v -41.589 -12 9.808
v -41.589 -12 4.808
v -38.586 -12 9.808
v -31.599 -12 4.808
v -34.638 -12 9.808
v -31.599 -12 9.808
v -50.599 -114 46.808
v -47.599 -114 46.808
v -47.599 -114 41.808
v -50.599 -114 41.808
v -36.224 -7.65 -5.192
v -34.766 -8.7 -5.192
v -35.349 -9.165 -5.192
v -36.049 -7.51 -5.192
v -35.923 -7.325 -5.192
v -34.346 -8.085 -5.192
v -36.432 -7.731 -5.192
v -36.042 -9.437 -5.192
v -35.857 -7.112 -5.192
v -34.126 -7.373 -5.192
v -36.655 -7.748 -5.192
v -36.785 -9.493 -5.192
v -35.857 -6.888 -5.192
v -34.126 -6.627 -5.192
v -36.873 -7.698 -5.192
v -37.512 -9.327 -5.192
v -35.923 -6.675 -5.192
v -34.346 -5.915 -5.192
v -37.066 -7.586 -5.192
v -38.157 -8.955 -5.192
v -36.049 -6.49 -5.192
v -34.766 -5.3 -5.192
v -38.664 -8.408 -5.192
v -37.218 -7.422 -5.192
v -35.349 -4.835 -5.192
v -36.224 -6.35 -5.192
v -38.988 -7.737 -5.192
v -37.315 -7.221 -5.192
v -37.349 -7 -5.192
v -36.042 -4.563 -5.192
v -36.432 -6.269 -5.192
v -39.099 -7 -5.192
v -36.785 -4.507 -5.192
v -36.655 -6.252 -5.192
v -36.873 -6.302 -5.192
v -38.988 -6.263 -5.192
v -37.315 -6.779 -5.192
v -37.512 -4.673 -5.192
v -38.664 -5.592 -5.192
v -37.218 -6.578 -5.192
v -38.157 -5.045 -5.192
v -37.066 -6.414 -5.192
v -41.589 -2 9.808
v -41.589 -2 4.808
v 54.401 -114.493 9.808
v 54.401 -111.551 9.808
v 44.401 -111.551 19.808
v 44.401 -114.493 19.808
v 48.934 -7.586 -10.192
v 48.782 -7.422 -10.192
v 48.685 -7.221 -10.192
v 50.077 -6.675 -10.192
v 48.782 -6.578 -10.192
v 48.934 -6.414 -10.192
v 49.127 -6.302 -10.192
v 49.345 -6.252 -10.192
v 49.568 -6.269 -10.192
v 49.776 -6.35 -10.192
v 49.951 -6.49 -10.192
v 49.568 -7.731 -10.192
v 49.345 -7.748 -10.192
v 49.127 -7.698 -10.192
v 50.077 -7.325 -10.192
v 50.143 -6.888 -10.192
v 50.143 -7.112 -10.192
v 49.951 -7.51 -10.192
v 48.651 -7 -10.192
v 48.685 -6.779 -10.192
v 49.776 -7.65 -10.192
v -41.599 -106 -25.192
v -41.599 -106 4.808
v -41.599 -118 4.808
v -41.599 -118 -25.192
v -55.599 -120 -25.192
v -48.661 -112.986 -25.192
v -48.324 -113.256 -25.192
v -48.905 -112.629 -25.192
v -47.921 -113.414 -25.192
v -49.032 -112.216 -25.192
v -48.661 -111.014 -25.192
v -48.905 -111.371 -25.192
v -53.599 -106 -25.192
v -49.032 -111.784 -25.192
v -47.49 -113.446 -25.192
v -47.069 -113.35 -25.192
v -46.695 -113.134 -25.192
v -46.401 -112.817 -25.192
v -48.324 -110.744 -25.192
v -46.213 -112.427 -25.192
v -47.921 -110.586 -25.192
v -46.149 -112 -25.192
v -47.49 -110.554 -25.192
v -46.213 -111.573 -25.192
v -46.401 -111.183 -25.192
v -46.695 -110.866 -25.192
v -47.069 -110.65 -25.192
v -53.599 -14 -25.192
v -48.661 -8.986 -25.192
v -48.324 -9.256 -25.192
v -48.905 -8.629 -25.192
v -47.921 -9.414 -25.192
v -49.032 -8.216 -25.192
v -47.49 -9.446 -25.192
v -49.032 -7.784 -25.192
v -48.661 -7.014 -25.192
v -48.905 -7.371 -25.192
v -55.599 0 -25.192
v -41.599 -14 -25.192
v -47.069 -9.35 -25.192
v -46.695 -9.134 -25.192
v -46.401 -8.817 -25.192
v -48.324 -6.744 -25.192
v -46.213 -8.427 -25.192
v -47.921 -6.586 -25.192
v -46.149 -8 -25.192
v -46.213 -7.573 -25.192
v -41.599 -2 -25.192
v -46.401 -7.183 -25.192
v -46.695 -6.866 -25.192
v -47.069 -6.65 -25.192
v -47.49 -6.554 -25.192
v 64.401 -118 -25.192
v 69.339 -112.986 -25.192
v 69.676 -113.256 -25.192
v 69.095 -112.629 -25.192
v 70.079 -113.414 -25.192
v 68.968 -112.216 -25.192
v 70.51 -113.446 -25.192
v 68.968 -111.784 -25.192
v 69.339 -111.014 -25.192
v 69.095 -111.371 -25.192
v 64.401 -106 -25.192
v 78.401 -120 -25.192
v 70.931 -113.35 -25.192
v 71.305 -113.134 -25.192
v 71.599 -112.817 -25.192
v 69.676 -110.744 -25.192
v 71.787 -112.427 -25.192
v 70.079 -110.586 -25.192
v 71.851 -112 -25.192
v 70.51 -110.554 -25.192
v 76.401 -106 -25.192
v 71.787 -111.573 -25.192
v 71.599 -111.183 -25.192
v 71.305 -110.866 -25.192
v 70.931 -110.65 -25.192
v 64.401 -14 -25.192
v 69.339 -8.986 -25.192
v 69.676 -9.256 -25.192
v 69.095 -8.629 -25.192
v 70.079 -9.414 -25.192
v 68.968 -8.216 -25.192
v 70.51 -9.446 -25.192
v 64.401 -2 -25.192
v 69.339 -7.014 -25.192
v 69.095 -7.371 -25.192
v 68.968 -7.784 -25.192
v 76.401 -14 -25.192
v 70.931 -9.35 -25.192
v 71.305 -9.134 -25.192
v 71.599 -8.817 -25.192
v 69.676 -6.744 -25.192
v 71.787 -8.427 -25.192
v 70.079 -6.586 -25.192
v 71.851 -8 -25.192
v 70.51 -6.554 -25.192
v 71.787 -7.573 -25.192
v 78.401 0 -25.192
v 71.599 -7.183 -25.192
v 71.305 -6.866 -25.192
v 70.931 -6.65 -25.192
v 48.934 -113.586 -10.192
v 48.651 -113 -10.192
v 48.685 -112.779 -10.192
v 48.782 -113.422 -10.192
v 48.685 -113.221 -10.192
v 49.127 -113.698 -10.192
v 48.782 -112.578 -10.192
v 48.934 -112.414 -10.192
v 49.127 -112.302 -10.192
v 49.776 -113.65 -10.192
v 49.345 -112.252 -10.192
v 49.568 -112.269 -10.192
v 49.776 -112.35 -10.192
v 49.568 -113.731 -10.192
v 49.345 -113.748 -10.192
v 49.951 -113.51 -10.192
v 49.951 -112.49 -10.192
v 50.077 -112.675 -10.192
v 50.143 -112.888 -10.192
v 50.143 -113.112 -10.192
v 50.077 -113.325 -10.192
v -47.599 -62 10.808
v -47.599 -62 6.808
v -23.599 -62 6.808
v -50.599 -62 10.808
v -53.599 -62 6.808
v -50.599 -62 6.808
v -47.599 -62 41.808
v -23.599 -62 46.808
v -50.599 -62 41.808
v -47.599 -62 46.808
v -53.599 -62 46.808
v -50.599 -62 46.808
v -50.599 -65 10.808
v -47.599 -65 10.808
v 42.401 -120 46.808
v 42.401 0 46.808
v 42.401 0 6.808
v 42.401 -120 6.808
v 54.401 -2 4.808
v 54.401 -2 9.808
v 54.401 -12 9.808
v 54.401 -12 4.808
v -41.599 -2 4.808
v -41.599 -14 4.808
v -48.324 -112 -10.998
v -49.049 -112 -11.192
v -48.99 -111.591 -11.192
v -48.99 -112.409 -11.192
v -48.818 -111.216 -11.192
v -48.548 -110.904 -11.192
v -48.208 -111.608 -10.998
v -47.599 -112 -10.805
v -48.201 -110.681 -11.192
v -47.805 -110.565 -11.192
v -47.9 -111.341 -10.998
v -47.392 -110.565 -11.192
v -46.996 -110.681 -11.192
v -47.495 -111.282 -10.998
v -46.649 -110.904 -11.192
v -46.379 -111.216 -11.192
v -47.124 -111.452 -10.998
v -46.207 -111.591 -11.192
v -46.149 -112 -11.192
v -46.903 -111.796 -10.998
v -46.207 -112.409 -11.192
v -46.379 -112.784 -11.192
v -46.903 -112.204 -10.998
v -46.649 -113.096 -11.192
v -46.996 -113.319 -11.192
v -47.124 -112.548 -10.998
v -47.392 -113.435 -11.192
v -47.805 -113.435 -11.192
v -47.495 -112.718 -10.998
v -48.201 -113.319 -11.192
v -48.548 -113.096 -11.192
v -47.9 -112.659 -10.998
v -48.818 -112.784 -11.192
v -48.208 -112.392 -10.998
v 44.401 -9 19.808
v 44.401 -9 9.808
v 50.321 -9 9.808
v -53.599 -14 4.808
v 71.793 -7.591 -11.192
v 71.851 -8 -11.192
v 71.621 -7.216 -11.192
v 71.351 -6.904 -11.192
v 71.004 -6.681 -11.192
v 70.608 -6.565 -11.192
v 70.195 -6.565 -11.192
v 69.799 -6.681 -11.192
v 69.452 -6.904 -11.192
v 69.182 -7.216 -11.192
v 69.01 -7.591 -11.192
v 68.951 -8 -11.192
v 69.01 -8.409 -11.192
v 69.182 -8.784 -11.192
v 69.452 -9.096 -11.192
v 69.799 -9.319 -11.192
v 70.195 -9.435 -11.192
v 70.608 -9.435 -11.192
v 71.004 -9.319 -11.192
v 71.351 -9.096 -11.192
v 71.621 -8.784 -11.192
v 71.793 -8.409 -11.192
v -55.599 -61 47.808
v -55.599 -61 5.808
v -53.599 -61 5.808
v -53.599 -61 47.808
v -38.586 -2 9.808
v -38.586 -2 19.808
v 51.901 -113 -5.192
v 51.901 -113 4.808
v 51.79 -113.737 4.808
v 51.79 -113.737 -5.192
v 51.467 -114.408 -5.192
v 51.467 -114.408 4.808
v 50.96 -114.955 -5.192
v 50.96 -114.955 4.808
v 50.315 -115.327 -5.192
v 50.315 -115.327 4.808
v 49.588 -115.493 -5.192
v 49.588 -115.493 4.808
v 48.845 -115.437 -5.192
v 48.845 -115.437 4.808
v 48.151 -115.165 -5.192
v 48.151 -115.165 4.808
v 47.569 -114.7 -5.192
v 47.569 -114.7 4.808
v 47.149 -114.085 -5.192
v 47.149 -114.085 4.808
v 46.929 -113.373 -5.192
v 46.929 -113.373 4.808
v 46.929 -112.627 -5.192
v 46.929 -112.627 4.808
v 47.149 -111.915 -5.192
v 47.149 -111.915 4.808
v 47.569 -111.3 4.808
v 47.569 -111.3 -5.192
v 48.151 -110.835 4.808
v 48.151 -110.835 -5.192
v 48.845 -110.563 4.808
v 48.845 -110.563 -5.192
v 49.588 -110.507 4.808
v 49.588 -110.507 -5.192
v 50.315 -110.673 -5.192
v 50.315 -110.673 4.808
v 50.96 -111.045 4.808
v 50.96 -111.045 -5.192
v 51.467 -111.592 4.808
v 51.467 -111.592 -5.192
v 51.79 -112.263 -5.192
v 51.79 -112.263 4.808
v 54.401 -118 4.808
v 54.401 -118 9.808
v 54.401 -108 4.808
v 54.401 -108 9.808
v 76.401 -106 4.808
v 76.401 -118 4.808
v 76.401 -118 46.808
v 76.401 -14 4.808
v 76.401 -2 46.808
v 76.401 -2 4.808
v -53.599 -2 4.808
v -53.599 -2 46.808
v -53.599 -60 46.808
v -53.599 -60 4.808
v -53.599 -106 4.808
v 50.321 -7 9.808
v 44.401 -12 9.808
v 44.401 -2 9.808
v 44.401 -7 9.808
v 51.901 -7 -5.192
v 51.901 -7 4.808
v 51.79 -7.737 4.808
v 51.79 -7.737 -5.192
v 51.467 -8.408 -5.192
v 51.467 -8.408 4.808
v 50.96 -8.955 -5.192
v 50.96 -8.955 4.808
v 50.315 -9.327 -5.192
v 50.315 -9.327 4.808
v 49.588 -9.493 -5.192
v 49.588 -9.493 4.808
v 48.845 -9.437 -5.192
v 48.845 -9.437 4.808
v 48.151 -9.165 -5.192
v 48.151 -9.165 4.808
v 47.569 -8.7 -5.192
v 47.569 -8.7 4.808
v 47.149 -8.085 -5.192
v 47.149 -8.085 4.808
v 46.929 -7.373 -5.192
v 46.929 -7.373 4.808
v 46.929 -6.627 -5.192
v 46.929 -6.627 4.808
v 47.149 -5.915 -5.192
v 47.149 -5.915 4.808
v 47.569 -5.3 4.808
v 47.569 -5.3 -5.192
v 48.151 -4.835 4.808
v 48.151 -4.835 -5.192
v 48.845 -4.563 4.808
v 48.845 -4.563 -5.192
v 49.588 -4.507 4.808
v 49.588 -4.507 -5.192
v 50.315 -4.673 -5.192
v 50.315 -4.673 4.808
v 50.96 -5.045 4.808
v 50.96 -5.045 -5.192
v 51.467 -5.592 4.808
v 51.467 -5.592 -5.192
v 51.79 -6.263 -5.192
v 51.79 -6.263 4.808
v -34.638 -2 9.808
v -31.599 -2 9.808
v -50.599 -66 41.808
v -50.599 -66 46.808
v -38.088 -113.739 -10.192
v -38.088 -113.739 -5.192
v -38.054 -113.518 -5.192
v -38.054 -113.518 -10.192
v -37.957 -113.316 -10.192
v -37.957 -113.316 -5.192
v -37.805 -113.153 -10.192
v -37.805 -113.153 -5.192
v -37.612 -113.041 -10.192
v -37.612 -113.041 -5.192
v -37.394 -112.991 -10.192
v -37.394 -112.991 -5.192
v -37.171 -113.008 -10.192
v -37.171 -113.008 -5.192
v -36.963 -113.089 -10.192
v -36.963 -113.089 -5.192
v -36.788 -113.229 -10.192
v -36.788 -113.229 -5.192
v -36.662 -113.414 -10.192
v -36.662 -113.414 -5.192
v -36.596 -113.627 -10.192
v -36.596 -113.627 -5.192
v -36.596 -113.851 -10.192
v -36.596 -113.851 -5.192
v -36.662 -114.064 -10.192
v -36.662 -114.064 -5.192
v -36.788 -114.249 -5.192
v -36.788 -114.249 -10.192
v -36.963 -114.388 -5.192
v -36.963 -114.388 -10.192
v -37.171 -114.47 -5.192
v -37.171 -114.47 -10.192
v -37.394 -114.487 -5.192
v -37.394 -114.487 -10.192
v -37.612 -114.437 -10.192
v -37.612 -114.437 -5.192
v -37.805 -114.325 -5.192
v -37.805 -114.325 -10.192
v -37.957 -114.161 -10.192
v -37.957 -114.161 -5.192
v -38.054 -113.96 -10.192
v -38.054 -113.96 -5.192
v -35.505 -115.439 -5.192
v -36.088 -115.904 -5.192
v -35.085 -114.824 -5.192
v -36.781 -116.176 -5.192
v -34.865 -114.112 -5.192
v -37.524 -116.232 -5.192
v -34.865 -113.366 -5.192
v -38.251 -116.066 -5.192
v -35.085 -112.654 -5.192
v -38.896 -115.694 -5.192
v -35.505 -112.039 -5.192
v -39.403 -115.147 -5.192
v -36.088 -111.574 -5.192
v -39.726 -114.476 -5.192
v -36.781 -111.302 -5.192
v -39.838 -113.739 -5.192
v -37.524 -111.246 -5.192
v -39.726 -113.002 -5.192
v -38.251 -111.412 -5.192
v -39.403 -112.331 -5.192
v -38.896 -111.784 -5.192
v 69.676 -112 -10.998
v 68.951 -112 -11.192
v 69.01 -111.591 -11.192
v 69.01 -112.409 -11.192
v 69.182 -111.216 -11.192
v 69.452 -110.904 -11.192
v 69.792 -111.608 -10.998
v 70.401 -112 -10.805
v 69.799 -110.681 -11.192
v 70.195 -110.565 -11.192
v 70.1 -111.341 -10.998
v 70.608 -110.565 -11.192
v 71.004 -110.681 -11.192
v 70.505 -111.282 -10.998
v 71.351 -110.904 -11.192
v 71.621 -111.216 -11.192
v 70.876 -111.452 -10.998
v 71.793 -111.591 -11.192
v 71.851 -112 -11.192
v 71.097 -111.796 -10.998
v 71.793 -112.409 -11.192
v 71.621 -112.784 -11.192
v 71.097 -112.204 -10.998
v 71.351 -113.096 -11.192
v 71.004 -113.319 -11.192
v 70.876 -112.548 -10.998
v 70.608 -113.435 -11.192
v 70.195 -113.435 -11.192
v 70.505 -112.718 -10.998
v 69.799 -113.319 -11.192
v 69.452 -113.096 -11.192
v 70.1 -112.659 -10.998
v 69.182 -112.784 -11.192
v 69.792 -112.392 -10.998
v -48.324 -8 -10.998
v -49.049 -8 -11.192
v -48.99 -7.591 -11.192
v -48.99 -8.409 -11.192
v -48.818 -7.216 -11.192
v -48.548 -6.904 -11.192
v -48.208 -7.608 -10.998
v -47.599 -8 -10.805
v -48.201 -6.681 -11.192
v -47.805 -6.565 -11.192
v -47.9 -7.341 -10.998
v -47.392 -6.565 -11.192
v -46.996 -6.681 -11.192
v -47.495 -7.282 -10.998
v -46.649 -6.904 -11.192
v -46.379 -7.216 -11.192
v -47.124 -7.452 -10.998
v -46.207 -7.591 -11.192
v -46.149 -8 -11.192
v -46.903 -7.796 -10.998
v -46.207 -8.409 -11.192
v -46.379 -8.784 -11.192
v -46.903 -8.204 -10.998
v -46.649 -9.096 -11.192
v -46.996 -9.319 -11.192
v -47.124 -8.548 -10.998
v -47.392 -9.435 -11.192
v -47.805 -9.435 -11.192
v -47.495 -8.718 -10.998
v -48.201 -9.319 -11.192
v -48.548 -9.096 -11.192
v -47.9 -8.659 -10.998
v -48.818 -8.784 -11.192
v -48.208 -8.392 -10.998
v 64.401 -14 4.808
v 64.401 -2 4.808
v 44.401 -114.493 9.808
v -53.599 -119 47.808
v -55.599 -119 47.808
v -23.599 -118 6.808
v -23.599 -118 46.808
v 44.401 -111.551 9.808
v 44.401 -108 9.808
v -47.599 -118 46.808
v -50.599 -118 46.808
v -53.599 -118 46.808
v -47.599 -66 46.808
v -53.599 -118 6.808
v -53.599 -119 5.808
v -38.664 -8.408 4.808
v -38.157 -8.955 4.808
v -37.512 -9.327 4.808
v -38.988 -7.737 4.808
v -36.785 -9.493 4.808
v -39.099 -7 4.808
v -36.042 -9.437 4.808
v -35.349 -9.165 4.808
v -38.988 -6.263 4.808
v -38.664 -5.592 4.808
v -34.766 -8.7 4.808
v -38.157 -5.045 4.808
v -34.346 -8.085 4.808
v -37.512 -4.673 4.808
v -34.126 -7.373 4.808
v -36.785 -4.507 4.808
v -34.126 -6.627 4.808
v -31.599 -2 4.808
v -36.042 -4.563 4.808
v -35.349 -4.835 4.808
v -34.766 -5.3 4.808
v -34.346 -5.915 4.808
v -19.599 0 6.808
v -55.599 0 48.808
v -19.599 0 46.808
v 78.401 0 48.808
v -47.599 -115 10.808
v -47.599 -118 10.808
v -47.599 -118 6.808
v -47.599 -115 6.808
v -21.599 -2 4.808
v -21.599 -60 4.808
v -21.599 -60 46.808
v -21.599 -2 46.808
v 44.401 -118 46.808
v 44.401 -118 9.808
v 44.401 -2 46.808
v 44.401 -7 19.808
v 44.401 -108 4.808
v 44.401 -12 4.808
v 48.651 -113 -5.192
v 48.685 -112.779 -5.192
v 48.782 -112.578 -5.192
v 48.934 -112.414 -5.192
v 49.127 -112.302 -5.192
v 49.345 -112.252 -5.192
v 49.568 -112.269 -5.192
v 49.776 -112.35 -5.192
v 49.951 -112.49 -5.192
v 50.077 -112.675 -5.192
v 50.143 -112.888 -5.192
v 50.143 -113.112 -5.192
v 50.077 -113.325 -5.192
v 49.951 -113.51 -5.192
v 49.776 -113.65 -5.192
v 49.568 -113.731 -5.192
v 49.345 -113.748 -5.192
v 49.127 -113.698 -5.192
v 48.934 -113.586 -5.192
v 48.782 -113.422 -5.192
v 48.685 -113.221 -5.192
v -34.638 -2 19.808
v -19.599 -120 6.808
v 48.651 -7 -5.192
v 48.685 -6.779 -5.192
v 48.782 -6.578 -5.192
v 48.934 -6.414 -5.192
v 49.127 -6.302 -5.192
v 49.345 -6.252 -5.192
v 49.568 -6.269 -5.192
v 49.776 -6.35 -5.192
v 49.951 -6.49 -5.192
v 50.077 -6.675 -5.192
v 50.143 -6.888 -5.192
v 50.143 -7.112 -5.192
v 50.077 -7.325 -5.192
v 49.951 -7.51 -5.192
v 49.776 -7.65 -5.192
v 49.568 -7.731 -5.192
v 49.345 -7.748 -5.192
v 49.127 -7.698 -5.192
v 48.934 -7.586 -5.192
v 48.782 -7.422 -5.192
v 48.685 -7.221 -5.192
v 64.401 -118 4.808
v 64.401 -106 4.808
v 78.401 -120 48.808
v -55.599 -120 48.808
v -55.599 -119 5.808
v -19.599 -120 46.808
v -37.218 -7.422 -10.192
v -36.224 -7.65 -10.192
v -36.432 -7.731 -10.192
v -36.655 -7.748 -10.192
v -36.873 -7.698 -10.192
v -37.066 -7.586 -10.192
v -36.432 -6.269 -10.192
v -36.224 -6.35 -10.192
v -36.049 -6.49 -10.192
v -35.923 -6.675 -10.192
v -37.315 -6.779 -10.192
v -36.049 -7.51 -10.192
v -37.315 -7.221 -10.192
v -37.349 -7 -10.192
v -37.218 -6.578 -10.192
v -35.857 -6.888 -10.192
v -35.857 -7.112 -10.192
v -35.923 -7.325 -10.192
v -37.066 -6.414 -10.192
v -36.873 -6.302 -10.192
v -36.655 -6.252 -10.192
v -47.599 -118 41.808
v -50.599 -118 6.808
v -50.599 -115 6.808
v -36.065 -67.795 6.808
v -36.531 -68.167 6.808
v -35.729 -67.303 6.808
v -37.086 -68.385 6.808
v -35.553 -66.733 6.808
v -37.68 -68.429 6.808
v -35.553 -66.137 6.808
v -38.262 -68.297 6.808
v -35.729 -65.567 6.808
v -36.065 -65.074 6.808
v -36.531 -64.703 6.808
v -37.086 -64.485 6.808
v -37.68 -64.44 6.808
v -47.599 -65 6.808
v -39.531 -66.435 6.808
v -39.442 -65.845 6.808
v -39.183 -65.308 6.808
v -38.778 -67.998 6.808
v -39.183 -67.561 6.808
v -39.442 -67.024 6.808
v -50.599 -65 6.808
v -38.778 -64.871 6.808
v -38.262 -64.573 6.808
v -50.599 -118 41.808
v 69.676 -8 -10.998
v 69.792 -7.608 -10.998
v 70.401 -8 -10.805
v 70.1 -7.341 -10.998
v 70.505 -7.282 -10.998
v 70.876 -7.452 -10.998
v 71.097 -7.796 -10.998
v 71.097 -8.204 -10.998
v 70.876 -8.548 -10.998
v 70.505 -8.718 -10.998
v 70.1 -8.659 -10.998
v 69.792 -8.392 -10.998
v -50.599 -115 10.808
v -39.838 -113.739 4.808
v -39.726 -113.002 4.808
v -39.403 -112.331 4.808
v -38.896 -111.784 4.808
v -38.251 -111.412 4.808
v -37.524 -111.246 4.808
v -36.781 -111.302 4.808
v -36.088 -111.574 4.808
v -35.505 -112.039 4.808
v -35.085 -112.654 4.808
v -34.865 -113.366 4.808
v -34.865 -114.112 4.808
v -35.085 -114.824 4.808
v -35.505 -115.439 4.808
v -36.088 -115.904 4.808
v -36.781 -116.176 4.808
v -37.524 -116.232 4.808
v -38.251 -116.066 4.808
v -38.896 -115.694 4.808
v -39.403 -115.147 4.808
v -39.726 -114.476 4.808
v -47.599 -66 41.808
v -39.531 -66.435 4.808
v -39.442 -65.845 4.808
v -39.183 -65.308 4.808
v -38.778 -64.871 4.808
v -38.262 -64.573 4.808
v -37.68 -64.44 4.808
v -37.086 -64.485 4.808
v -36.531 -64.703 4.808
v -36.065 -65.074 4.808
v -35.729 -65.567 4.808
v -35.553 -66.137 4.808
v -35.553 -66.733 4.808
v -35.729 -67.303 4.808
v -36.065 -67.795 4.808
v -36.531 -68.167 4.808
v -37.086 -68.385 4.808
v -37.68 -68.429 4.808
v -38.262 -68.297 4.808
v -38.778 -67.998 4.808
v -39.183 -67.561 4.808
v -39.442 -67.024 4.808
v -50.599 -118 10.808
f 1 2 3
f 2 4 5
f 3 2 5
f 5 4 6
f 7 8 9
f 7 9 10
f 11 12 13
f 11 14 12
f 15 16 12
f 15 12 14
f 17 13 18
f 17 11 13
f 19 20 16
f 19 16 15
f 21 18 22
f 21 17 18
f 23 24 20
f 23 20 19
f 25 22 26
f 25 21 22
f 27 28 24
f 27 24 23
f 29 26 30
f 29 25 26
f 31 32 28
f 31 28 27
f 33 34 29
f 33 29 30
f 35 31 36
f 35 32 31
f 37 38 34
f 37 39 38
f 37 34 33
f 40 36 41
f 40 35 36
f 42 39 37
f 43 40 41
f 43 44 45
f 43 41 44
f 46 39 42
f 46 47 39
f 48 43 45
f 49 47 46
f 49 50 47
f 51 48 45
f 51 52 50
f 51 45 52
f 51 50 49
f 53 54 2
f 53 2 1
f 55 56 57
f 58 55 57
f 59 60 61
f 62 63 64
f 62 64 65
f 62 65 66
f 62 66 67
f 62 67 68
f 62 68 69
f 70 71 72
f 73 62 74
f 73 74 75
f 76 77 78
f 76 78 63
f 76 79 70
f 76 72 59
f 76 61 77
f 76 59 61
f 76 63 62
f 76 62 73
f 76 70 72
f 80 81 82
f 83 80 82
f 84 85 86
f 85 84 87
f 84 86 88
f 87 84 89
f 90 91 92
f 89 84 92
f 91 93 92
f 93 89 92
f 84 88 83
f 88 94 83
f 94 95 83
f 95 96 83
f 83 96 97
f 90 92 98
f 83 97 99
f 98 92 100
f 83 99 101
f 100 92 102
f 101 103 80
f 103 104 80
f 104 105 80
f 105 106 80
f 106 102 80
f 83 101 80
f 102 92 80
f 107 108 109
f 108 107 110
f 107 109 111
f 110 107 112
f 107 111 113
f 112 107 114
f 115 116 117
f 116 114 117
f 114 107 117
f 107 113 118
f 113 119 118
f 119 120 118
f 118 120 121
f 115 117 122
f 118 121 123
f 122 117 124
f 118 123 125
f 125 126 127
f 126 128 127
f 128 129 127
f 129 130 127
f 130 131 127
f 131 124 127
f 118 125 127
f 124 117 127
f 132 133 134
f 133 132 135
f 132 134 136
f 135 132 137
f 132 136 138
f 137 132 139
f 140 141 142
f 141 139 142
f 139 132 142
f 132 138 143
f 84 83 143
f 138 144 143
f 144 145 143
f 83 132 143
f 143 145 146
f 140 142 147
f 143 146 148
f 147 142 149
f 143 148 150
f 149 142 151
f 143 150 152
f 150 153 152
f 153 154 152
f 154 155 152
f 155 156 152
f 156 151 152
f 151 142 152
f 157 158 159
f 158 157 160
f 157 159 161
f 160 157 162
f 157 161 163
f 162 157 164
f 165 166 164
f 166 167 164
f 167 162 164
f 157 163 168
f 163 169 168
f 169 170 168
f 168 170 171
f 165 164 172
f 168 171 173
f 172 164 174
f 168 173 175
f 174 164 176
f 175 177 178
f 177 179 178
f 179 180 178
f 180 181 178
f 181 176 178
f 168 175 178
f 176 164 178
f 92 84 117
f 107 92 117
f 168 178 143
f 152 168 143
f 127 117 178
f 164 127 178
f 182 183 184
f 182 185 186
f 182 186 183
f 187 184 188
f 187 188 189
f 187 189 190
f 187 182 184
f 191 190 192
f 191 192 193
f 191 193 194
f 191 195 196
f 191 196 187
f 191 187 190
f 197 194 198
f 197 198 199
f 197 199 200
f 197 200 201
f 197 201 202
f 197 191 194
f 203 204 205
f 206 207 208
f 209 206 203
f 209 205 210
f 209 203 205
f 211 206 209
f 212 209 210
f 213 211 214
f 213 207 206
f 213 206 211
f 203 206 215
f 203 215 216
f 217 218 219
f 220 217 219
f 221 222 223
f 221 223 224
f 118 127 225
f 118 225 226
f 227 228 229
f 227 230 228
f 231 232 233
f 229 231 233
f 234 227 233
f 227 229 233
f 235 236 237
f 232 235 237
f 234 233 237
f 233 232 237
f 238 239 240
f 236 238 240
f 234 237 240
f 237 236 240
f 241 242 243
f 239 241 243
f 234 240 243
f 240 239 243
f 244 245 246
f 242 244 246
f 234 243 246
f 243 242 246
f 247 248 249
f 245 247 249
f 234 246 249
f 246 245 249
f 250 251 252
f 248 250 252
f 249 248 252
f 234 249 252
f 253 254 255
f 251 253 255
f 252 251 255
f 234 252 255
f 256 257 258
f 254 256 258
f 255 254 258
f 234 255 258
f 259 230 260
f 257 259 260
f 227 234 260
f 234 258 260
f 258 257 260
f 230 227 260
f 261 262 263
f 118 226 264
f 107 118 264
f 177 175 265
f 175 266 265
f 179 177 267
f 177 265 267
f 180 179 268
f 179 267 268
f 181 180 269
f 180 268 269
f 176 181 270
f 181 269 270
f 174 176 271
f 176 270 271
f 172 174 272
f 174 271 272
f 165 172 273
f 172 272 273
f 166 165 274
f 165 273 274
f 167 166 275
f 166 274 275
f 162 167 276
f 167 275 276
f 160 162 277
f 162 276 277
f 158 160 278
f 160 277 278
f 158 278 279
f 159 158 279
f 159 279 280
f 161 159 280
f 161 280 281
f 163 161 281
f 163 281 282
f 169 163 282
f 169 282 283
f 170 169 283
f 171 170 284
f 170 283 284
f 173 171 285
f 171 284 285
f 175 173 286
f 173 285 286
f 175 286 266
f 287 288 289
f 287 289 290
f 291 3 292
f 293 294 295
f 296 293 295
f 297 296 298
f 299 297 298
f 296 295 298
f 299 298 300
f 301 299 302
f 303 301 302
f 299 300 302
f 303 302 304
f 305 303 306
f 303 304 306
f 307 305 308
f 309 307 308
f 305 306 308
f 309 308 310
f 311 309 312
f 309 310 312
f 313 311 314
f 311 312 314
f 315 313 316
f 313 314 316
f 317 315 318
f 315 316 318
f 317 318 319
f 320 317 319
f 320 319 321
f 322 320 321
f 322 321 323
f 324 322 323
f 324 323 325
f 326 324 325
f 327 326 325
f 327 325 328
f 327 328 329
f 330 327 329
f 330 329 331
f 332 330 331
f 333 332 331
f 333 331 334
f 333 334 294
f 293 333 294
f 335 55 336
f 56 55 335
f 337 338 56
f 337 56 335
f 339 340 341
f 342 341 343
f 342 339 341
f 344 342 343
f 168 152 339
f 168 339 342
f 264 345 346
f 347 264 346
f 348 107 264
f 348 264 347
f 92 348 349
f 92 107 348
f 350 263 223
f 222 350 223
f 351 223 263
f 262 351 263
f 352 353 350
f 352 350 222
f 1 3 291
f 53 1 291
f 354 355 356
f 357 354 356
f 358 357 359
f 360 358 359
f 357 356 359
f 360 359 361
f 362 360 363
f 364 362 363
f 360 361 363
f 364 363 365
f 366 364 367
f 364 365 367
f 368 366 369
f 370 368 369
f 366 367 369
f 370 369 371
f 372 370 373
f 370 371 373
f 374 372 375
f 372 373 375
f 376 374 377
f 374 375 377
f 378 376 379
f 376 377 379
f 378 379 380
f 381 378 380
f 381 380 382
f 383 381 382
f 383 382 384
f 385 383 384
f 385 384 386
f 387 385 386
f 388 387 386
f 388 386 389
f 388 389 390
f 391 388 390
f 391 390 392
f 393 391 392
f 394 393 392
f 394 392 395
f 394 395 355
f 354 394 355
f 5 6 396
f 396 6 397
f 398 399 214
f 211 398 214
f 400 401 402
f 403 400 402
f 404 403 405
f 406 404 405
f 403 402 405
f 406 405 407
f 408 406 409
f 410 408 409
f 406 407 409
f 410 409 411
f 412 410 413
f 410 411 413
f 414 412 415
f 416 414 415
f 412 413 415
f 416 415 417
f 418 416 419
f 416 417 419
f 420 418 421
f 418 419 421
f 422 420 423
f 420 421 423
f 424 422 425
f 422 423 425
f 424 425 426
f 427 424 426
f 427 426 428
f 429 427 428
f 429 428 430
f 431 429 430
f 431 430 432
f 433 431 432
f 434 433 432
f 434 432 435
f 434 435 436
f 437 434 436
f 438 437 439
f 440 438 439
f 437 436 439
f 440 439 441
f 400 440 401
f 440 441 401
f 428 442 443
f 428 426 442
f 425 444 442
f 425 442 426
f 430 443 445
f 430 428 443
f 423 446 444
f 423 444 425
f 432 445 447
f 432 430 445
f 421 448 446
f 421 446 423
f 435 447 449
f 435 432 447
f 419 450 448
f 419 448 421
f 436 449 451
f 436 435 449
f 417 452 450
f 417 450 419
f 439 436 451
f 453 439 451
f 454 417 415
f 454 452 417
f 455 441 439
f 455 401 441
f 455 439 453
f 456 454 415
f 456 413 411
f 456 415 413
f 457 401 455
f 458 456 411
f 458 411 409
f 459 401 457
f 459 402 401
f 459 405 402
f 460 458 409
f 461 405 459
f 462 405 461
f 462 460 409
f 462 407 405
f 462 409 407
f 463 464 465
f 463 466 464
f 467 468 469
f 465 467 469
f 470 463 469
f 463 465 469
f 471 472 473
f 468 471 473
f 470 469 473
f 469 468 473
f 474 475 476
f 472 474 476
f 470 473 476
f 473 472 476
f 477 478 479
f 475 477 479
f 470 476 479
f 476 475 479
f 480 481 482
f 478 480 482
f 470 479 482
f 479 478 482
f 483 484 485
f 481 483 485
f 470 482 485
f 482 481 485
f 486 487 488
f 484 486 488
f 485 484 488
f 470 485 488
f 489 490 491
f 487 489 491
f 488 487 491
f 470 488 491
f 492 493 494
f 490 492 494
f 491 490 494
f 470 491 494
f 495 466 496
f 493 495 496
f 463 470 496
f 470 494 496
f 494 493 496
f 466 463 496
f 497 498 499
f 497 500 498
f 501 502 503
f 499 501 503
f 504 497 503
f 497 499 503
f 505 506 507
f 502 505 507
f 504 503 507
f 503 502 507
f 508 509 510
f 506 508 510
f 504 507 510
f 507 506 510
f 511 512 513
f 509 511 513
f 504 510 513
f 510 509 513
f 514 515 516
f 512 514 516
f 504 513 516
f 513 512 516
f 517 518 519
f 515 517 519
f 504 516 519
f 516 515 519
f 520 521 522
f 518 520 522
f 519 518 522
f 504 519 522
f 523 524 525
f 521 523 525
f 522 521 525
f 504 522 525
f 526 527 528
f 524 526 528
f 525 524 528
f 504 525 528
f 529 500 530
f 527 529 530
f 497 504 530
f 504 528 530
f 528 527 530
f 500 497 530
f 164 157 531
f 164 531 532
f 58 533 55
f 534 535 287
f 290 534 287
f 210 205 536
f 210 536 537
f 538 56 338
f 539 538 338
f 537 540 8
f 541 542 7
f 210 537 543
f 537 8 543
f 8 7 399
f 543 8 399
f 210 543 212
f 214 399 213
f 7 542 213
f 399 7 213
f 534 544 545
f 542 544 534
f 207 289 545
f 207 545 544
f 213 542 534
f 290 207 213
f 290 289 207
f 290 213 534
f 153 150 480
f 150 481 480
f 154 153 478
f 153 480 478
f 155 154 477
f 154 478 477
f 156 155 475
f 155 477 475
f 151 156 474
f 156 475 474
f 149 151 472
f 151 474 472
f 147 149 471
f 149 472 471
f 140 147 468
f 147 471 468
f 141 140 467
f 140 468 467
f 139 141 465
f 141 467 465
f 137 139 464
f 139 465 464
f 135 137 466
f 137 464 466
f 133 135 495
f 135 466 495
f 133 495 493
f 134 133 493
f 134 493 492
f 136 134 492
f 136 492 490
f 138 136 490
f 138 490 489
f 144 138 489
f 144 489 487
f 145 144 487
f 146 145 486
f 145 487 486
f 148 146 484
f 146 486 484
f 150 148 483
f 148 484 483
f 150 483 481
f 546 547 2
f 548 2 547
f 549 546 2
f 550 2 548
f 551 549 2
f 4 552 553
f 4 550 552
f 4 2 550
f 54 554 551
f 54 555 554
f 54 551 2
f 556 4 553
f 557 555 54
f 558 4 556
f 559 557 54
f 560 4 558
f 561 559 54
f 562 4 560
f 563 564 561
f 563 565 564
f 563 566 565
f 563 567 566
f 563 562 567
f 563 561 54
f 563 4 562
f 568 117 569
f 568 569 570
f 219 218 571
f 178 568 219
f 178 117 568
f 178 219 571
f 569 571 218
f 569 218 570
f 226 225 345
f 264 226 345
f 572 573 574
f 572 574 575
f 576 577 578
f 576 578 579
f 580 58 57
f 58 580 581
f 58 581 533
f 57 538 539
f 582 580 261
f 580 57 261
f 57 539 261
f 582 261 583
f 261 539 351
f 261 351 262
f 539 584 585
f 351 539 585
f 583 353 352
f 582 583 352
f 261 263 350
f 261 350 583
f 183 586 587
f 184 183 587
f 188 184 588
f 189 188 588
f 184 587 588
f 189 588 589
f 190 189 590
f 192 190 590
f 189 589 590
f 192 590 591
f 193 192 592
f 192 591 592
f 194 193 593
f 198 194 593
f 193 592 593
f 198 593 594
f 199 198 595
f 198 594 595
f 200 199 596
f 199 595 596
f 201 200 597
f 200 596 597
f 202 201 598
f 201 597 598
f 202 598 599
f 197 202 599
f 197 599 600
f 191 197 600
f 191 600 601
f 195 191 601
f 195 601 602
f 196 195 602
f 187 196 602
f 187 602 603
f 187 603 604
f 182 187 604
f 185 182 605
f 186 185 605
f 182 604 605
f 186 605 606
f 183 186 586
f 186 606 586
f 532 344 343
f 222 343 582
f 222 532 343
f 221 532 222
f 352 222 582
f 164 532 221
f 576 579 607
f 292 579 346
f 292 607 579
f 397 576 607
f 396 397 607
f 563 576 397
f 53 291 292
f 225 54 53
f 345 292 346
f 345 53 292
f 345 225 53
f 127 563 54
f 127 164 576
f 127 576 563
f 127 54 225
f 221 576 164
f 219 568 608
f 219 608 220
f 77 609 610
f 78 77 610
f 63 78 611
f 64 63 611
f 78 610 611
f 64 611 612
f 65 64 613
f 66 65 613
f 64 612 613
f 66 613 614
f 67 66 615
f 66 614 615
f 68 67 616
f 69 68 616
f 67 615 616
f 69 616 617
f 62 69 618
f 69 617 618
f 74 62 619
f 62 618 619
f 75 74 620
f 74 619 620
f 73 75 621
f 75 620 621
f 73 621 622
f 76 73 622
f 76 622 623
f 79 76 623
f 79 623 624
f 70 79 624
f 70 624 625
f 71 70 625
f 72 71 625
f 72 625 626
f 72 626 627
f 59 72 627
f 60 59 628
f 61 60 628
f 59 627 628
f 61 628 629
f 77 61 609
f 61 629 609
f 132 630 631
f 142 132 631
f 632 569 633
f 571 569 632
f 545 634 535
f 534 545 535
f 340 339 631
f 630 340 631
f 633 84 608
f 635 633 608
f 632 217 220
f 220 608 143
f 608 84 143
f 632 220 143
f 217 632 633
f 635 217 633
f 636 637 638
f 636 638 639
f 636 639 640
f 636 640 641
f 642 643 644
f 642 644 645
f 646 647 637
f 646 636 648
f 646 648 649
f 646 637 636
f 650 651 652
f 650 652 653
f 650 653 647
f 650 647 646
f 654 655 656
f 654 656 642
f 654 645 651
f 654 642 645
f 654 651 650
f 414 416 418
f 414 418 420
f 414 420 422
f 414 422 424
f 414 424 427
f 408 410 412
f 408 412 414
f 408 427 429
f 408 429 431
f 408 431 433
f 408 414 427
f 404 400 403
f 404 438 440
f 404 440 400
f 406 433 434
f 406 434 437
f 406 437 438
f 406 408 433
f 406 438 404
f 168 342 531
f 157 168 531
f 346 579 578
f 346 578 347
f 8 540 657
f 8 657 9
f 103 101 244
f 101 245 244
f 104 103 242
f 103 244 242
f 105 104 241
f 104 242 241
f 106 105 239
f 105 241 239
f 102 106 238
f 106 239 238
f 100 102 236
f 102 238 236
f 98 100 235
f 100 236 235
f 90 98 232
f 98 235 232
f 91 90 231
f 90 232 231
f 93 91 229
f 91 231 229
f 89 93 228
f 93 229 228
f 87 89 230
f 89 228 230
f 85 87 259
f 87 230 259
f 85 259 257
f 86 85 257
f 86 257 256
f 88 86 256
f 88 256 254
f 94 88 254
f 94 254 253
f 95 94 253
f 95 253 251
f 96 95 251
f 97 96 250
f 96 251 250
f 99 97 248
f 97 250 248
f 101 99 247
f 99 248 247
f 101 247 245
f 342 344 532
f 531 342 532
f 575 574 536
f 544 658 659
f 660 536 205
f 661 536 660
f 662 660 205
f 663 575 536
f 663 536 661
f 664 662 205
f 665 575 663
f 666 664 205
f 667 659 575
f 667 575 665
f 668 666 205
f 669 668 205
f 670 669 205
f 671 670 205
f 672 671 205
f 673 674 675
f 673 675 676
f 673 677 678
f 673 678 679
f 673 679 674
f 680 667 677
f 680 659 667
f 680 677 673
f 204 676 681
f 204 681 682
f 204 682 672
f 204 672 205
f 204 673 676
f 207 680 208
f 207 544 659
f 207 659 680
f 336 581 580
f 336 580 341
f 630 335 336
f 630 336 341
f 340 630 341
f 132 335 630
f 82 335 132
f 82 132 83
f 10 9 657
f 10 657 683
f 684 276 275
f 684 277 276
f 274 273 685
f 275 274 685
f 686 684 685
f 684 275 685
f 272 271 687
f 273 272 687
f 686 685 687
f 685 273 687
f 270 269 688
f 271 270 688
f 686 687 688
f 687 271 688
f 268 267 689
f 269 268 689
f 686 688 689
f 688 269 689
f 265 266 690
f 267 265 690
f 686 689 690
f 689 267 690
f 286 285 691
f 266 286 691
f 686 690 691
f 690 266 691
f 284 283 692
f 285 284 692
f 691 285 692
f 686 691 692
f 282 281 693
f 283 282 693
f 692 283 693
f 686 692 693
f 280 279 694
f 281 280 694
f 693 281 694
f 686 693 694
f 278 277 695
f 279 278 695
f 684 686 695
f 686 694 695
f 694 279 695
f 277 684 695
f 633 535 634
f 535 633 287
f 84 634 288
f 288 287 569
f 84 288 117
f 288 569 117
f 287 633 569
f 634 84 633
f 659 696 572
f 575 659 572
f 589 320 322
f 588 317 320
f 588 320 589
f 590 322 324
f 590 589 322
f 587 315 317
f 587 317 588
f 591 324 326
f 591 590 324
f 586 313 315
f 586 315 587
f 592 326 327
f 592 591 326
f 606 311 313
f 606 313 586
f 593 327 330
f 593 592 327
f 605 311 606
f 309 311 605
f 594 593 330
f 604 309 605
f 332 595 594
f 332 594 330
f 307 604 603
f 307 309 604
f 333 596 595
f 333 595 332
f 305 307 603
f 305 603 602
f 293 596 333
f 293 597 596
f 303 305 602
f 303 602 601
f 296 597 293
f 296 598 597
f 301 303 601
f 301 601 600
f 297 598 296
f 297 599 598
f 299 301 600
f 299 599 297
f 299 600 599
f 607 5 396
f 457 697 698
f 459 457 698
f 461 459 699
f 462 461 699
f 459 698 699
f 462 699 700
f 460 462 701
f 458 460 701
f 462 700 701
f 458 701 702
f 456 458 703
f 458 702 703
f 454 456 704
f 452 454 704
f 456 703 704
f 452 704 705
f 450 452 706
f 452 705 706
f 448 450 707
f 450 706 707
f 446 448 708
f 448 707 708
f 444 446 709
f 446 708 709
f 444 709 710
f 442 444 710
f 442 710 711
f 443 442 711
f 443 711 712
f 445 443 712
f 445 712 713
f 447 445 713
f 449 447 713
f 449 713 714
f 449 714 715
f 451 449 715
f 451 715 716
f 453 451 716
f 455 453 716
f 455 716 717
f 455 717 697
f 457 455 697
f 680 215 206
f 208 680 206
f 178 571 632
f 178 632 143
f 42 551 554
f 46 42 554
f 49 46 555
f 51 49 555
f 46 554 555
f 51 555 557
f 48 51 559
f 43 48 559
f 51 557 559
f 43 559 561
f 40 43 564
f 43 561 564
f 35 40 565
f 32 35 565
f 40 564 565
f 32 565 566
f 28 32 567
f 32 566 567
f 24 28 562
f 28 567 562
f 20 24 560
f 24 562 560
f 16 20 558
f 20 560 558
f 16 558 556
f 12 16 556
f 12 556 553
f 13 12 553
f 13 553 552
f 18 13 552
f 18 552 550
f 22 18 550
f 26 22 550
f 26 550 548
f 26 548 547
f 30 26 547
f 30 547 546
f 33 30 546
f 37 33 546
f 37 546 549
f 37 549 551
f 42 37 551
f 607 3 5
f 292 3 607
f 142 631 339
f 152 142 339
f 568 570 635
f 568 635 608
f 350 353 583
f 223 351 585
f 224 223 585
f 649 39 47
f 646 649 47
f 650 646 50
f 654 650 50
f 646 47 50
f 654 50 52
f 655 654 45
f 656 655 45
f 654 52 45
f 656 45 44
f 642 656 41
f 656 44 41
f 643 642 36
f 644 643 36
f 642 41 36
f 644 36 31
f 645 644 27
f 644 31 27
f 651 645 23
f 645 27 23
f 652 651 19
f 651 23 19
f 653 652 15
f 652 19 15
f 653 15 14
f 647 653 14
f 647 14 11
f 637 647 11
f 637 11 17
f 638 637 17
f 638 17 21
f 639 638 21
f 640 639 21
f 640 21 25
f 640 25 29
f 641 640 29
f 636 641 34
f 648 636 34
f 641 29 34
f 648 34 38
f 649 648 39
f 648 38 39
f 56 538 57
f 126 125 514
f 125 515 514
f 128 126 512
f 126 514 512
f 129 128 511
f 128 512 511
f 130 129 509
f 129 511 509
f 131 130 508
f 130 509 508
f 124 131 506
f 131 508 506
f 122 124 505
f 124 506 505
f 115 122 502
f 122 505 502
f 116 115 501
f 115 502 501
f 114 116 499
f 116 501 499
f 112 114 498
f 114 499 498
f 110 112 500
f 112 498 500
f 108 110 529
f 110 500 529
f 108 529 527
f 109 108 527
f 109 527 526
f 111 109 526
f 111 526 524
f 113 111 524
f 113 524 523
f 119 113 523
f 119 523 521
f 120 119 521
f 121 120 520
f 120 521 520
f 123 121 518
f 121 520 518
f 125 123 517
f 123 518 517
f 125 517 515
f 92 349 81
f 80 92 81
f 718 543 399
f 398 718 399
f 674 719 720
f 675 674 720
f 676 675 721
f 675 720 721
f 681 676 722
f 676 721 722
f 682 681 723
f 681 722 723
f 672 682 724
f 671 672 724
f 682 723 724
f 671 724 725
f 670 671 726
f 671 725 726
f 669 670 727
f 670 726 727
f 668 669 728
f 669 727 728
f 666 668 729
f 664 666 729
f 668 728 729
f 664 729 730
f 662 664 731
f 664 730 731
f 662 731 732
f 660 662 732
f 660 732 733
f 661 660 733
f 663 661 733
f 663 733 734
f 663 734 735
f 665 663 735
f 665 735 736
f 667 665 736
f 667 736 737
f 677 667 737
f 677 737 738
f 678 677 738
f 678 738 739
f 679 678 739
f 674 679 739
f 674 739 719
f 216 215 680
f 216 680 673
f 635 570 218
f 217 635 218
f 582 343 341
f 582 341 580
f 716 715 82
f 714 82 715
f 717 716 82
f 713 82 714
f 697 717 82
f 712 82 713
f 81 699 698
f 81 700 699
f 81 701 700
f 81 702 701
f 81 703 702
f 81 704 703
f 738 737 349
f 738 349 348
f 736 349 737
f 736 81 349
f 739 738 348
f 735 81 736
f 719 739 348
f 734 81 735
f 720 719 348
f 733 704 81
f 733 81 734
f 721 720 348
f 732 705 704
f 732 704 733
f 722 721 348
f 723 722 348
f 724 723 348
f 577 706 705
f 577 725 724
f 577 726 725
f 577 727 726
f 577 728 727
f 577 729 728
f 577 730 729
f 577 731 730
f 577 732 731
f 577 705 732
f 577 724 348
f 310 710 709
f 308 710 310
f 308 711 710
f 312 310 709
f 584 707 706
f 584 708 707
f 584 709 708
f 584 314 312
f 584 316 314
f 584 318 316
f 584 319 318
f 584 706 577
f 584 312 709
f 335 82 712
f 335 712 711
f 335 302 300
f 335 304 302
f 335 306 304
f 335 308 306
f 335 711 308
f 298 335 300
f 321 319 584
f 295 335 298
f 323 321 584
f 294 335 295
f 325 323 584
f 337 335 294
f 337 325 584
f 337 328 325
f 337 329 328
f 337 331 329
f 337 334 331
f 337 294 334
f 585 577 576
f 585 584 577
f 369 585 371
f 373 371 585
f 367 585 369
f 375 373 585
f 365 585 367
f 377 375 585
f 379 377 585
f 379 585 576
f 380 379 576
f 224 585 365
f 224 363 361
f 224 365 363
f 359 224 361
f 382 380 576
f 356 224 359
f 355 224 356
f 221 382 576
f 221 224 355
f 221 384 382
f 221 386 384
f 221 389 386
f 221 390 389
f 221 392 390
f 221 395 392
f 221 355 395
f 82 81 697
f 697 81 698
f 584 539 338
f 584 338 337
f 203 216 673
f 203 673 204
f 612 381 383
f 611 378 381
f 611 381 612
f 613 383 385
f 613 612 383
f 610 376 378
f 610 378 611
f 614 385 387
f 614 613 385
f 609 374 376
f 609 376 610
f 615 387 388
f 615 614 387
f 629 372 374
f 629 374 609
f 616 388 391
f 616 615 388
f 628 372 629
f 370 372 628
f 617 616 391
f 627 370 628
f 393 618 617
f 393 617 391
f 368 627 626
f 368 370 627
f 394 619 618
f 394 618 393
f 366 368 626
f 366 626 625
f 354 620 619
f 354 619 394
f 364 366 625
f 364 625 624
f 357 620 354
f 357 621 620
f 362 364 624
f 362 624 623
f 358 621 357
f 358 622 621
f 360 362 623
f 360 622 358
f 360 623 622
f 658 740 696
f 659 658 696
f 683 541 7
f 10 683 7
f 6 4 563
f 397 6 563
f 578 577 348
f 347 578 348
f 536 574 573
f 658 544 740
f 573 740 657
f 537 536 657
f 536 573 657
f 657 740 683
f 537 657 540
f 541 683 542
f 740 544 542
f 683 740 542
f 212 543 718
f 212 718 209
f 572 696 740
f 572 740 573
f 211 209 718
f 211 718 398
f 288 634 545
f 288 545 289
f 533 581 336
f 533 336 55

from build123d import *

# Parameters (mm, degrees)
SKETCH1_W                      = 134
SKETCH1_H                      = 74
SKETCH1_W_2                    = 62
SKETCH1_H_2                    = 40
BOSS_EXTRUDE1_DEPTH            = 120
CUT_EXTRUDE1_DEPTH             = 30
SKETCH4_W                      = 32
SKETCH4_H                      = 58
CUT_EXTRUDE2_DEPTH             = 42
SKETCH5_W                      = 32
SKETCH5_H                      = 116
CUT_EXTRUDE3_DEPTH             = 42
M2_5_CLEARANCE_HOLE1_D         = 2.9
M2_5_CLEARANCE_HOLE1_DEPTH     = 14
M2_5_CLEARANCE_HOLE1_TIP       = 0.386628252
SKETCH9_W                      = 40
SKETCH9_H                      = 56
CUT_EXTRUDE9_DEPTH             = 32
CUT_EXTRUDE5_DEPTH             = 20
CUT_EXTRUDE6_DEPTH             = 10
SKETCH12_W                     = 5
SKETCH12_H                     = 10
BOSS_EXTRUDE2_DEPTH            = 10
SKETCH13_R                     = 2.5
BOSS_EXTRUDE4_DEPTH            = 15
SKETCH14_W                     = 5
SKETCH14_H                     = 10
BOSS_EXTRUDE3_DEPTH            = 19.99
SKETCH17_W                     = 10
SKETCH17_H                     = 10
CUT_EXTRUDE10_DEPTH            = 5
SKETCH18_R                     = 2.5
BOSS_EXTRUDE5_DEPTH            = 15
CUT_EXTRUDE11_START            = -5
SKETCH19_R                     = 2.5
SKETCH19_R_2                   = 0.75
CUT_EXTRUDE11_DEPTH            = 5
SKETCH24_W                     = 5.919805253
SKETCH24_H                     = 2
BOSS_EXTRUDE6_DEPTH            = 10
CUT_EXTRUDE14_REACH            = 146.395
SKETCH26_W                     = 10
SKETCH26_H                     = 2.941902197
BOSS_EXTRUDE7_DEPTH            = 10
CUT_EXTRUDE15_REACH            = 146.819
SKETCH30_W                     = 3.947736589
SKETCH30_H                     = 10
BOSS_EXTRUDE8_DEPTH            = 10
CUT_EXTRUDE18_REACH            = 176.552
SKETCH33_W                     = 42
SKETCH33_H                     = 58
SKETCH33_W_2                   = 40
SKETCH33_H_2                   = 56
CUT_EXTRUDE20_DEPTH            = 2
CUT_EXTRUDE21_REACH            = 151.943
SKETCH34_R                     = 2
SKETCH36_W                     = 3
SKETCH36_H                     = 4
SUPORTE_DA_TAMPA_PILHA_DEPTH   = 5
SKETCH37_W                     = 3
SKETCH37_H                     = 3
SUPORTE_DA_TAMPA_2_PILHA_DEPTH = 4


with BuildPart() as part:
    # Sketch1 → Boss-Extrude1 (new body)
    with BuildSketch(Plane(origin=(0, 0, 0), x_dir=(1, 0, 0), z_dir=(0, 1, 0))):
        with Locations((11.401433692, -11.808243728)):
            Rectangle(SKETCH1_W, SKETCH1_H)
        with Locations((11.401433692, -26.808243728)):
            Rectangle(SKETCH1_W_2, SKETCH1_H_2, mode=Mode.SUBTRACT)
    extrude(amount=-BOSS_EXTRUDE1_DEPTH)

    # Sketch2 → Cut-Extrude1 (cut)
    with BuildSketch(Plane(origin=(0, 0, -25.191756272), x_dir=(-1, 0, 0), z_dir=(0, 0, -1))):
        Polygon((21.598566308, -118), (-64.401433692, -118), (-64.401433692, -106), (-76.401433692, -106), (-76.401433692, -14), (-64.401433692, -14), (-64.401433692, -2), (41.598566308, -2), (41.598566308, -14), (53.598566308, -14), (53.598566308, -88), (21.598566308, -88), align=None)
    extrude(amount=-CUT_EXTRUDE1_DEPTH, mode=Mode.SUBTRACT)

    # Sketch4 → Cut-Extrude2 (cut)
    with BuildSketch(Plane(origin=(0, 0, 4.808243728), x_dir=(-1, 0, 0), z_dir=(0, 0, -1))):
        with Locations((37.598566308, -31)):
            Rectangle(SKETCH4_W, SKETCH4_H)
    extrude(amount=-CUT_EXTRUDE2_DEPTH, mode=Mode.SUBTRACT)

    # Sketch5 → Cut-Extrude3 (cut)
    with BuildSketch(Plane(origin=(0, 0, 4.808243728), x_dir=(-1, 0, 0), z_dir=(0, 0, -1))):
        with Locations((-60.401433692, -60)):
            Rectangle(SKETCH5_W, SKETCH5_H)
    extrude(amount=-CUT_EXTRUDE3_DEPTH, mode=Mode.SUBTRACT)

    # M2.5 Clearance Hole1
    with Locations(Plane(origin=(0, 0, -25.191756272), x_dir=(-1, 0, 0), z_dir=(0, 0, -1))):
        with Locations((-70.401433692, -8), (47.598566308, -8), (47.598566308, -112), (-70.401433692, -112)):
            Hole(M2_5_CLEARANCE_HOLE1_D / 2, depth=M2_5_CLEARANCE_HOLE1_DEPTH)
            with Locations((0, 0, -(M2_5_CLEARANCE_HOLE1_DEPTH + M2_5_CLEARANCE_HOLE1_TIP / 2))):  # 150.14° drill point
                Cone(0, M2_5_CLEARANCE_HOLE1_D / 2, M2_5_CLEARANCE_HOLE1_TIP, mode=Mode.SUBTRACT)

    # Sketch9 → Cut-Extrude9 (cut)
    with BuildSketch(Plane.ZY.offset(55.598566308)):
        with Locations((26.808243728, -90)):
            Rectangle(SKETCH9_W, SKETCH9_H)
    extrude(amount=-CUT_EXTRUDE9_DEPTH, mode=Mode.SUBTRACT)

    # Sketch10 → Cut-Extrude5 (cut)
    with BuildSketch(Plane(origin=(0, 0, -25.191756272), x_dir=(-1, 0, 0), z_dir=(0, 0, -1))):
        Polygon((21.598566308, -88), (53.598566308, -88), (53.598566308, -106), (41.598566308, -106), (41.598566308, -118), (21.598566308, -118), align=None)
    extrude(amount=-CUT_EXTRUDE5_DEPTH, mode=Mode.SUBTRACT)

    # Sketch11 → Cut-Extrude6 (cut)
    with BuildSketch(Plane(origin=(0, 0, -5.191756272), x_dir=(-1, 0, 0), z_dir=(0, 0, -1))):
        Polygon((53.598566308, -88), (21.598566308, -88), (21.598566308, -118), (41.598566308, -118), (41.598566308, -106), (53.598566308, -106), align=None)
    extrude(amount=-CUT_EXTRUDE6_DEPTH, mode=Mode.SUBTRACT)

    # Sketch12 → Boss-Extrude2 (add)
    with BuildSketch(Plane(origin=(44.401433692, 0, 0), x_dir=(0, 0, -1), z_dir=(1, 0, 0))):
        with Locations((-7.308243728, -7)):
            Rectangle(SKETCH12_W, SKETCH12_H)
        with Locations((-7.308243728, -113)):
            Rectangle(SKETCH12_W, SKETCH12_H)
    extrude(amount=BOSS_EXTRUDE2_DEPTH)

    # Sketch13 → Boss-Extrude4 (add)
    with BuildSketch(Plane(origin=(0, 0, 4.808243728), x_dir=(-1, 0, 0), z_dir=(0, 0, -1))):
        with Locations(Location((-49.401433692, -7, 0), (0, 0, 180))):
            Circle(SKETCH13_R)
        with Locations(Location((-49.401433692, -113, 0), (0, 0, 180))):
            Circle(SKETCH13_R)
    extrude(amount=BOSS_EXTRUDE4_DEPTH)

    # Sketch14 → Boss-Extrude3 (add)
    with BuildSketch(Plane.ZY.offset(21.598566308)):
        with Locations((7.308243728, -7)):
            Rectangle(SKETCH14_W, SKETCH14_H)
    extrude(amount=BOSS_EXTRUDE3_DEPTH)

    # Sketch17 → Cut-Extrude10 (cut)
    with BuildSketch(Plane(origin=(0, 0, 4.808243728), x_dir=(-1, 0, 0), z_dir=(0, 0, -1))):
        with Locations((26.598566308, -7)):
            Rectangle(SKETCH17_W, SKETCH17_H)
    extrude(amount=-CUT_EXTRUDE10_DEPTH, mode=Mode.SUBTRACT)

    # Sketch18 → Boss-Extrude5 (add)
    with BuildSketch(Plane(origin=(0, 0, 4.808243728), x_dir=(-1, 0, 0), z_dir=(0, 0, -1))):
        with Locations((36.598571318, -7)):
            Circle(SKETCH18_R)
        with Locations((37.337526325, -113.738960016)):
            Circle(SKETCH18_R)
    extrude(amount=BOSS_EXTRUDE5_DEPTH)

    # Sketch19 → Cut-Extrude11 (cut)
    # profile 1 of 4: a face of its own
    with BuildSketch(Plane(origin=(0, 0, -10.191756272), x_dir=(-1, 0, 0), z_dir=(0, 0, -1)).offset(CUT_EXTRUDE11_START)):
        with Locations(Location((-49.401433692, -113, 0), (0, 0, 180))):
            Circle(SKETCH19_R)
        with Locations((-49.401433692, -113)):
            Circle(SKETCH19_R_2, mode=Mode.SUBTRACT)
    # profile 2 of 4: a face of its own
    with BuildSketch(Plane(origin=(0, 0, -10.191756272), x_dir=(-1, 0, 0), z_dir=(0, 0, -1)).offset(CUT_EXTRUDE11_START)):
        with Locations(Location((-49.401433692, -7, 0), (0, 0, 180))):
            Circle(SKETCH19_R)
        with Locations((-49.401433692, -7)):
            Circle(SKETCH19_R_2, mode=Mode.SUBTRACT)
    # profile 3 of 4: a face of its own
    with BuildSketch(Plane(origin=(0, 0, -10.191756272), x_dir=(-1, 0, 0), z_dir=(0, 0, -1)).offset(CUT_EXTRUDE11_START)):
        with Locations((36.598571318, -7)):
            Circle(SKETCH19_R)
        with Locations((36.598571318, -7)):
            Circle(SKETCH19_R_2, mode=Mode.SUBTRACT)
    # profile 4 of 4: a face of its own
    with BuildSketch(Plane(origin=(0, 0, -10.191756272), x_dir=(-1, 0, 0), z_dir=(0, 0, -1)).offset(CUT_EXTRUDE11_START)):
        with Locations((37.337526325, -113.738960016)):
            Circle(SKETCH19_R)
        with Locations((37.337526325, -113.738960016)):
            Circle(SKETCH19_R_2, mode=Mode.SUBTRACT)
    extrude(amount=CUT_EXTRUDE11_DEPTH, mode=Mode.SUBTRACT)

    # Sketch24 → Boss-Extrude6 (add)
    with BuildSketch(Plane.XY.offset(9.808243728)):
        with Locations((47.361336319, -8)):
            Rectangle(SKETCH24_W, SKETCH24_H)
    extrude(amount=BOSS_EXTRUDE6_DEPTH)

    # Sketch25 → Cut-Extrude14 (cut, up to next)
    with BuildSketch(Plane.XZ.offset(9), mode=Mode.PRIVATE) as cut_extrude14_sk1:
        Polygon((50.321238945, 9.808243728), (44.401433692, 19.808243728), (50.321238945, 19.808243728), align=None)
    cut_extrude14_tool1 = extrude(cut_extrude14_sk1.sketch, amount=-CUT_EXTRUDE14_REACH, mode=Mode.PRIVATE) & part.part
    add(cut_extrude14_tool1.solids().sort_by_distance((48.347971, -9, 16.47491))[0], mode=Mode.SUBTRACT)

    # Sketch26 → Boss-Extrude7 (add)
    with BuildSketch(Plane.XY.offset(9.808243728)):
        with Locations((49.401433692, -113.021848151)):
            Rectangle(SKETCH26_W, SKETCH26_H)
    extrude(amount=BOSS_EXTRUDE7_DEPTH)

    # Sketch27 → Cut-Extrude15 (cut, up to next)
    with BuildSketch(Plane(origin=(0, -111.550897052, 0), x_dir=(1, 0, 0), z_dir=(0, 1, 0)), mode=Mode.PRIVATE) as cut_extrude15_sk1:
        Polygon((54.401433692, -9.808243728), (44.401433692, -19.808243728), (54.401433692, -19.808243728), align=None)
    cut_extrude15_tool1 = extrude(cut_extrude15_sk1.sketch, amount=-CUT_EXTRUDE15_REACH, mode=Mode.PRIVATE) & part.part
    add(cut_extrude15_tool1.solids().sort_by_distance((51.0681, -111.550897, 16.47491))[0], mode=Mode.SUBTRACT)

    # Sketch30 → Boss-Extrude8 (add)
    with BuildSketch(Plane.XY.offset(9.808243728)):
        with Locations((-36.612321656, -7)):
            Rectangle(SKETCH30_W, SKETCH30_H)
    extrude(amount=BOSS_EXTRUDE8_DEPTH)

    # Sketch31 → Cut-Extrude18 (cut, up to next)
    with BuildSketch(Plane.ZY.offset(38.58618995), mode=Mode.PRIVATE) as cut_extrude18_sk1:
        Polygon((19.808243728, -2), (19.808243728, -12), (9.808243728, -12), align=None)
    cut_extrude18_tool1 = extrude(cut_extrude18_sk1.sketch, amount=-CUT_EXTRUDE18_REACH, mode=Mode.PRIVATE) & part.part
    add(cut_extrude18_tool1.solids().sort_by_distance((-38.58619, -8.666667, 16.47491))[0], mode=Mode.SUBTRACT)

    # Sketch33 → Cut-Extrude20 (cut)
    with BuildSketch(Plane.ZY.offset(55.598566308)):
        with Locations((26.808243728, -90)):
            Rectangle(SKETCH33_W, SKETCH33_H)
        with Locations((26.808243728, -90)):
            Rectangle(SKETCH33_W_2, SKETCH33_H_2, mode=Mode.SUBTRACT)
    extrude(amount=-CUT_EXTRUDE20_DEPTH, mode=Mode.SUBTRACT)

    # Sketch34 → Cut-Extrude21 (cut, up to next)
    with BuildSketch(Plane(origin=(0, 0, 4.808243728), x_dir=(-1, 0, 0), z_dir=(0, 0, -1)), mode=Mode.PRIVATE) as cut_extrude21_sk1:
        with Locations((37.530823831, -66.434778505)):
            Circle(SKETCH34_R)
    cut_extrude21_tool1 = extrude(cut_extrude21_sk1.sketch, amount=-CUT_EXTRUDE21_REACH, mode=Mode.PRIVATE) & part.part
    add(cut_extrude21_tool1.solids().sort_by_distance((-37.530824, -66.434779, 4.808244))[0], mode=Mode.SUBTRACT)

    # Sketch36 → Suporte da Tampa - Pilha (add)
    with BuildSketch(Plane(origin=(0, 0, 46.808243728), x_dir=(-1, 0, 0), z_dir=(0, 0, -1))):
        with Locations((49.098566308, -116)):
            Rectangle(SKETCH36_W, SKETCH36_H)
        with Locations((49.098566308, -64)):
            Rectangle(SKETCH36_W, SKETCH36_H)
    extrude(amount=SUPORTE_DA_TAMPA_PILHA_DEPTH)

    # Sketch37 → Suporte da Tampa 2 - Pilha (add)
    with BuildSketch(Plane.XY.offset(6.808243728)):
        with Locations((-49.098566308, -116.5)):
            Rectangle(SKETCH37_W, SKETCH37_H)
        with Locations((-49.098566308, -63.5)):
            Rectangle(SKETCH37_W, SKETCH37_H)
    extrude(amount=SUPORTE_DA_TAMPA_2_PILHA_DEPTH)


solid = part.part
